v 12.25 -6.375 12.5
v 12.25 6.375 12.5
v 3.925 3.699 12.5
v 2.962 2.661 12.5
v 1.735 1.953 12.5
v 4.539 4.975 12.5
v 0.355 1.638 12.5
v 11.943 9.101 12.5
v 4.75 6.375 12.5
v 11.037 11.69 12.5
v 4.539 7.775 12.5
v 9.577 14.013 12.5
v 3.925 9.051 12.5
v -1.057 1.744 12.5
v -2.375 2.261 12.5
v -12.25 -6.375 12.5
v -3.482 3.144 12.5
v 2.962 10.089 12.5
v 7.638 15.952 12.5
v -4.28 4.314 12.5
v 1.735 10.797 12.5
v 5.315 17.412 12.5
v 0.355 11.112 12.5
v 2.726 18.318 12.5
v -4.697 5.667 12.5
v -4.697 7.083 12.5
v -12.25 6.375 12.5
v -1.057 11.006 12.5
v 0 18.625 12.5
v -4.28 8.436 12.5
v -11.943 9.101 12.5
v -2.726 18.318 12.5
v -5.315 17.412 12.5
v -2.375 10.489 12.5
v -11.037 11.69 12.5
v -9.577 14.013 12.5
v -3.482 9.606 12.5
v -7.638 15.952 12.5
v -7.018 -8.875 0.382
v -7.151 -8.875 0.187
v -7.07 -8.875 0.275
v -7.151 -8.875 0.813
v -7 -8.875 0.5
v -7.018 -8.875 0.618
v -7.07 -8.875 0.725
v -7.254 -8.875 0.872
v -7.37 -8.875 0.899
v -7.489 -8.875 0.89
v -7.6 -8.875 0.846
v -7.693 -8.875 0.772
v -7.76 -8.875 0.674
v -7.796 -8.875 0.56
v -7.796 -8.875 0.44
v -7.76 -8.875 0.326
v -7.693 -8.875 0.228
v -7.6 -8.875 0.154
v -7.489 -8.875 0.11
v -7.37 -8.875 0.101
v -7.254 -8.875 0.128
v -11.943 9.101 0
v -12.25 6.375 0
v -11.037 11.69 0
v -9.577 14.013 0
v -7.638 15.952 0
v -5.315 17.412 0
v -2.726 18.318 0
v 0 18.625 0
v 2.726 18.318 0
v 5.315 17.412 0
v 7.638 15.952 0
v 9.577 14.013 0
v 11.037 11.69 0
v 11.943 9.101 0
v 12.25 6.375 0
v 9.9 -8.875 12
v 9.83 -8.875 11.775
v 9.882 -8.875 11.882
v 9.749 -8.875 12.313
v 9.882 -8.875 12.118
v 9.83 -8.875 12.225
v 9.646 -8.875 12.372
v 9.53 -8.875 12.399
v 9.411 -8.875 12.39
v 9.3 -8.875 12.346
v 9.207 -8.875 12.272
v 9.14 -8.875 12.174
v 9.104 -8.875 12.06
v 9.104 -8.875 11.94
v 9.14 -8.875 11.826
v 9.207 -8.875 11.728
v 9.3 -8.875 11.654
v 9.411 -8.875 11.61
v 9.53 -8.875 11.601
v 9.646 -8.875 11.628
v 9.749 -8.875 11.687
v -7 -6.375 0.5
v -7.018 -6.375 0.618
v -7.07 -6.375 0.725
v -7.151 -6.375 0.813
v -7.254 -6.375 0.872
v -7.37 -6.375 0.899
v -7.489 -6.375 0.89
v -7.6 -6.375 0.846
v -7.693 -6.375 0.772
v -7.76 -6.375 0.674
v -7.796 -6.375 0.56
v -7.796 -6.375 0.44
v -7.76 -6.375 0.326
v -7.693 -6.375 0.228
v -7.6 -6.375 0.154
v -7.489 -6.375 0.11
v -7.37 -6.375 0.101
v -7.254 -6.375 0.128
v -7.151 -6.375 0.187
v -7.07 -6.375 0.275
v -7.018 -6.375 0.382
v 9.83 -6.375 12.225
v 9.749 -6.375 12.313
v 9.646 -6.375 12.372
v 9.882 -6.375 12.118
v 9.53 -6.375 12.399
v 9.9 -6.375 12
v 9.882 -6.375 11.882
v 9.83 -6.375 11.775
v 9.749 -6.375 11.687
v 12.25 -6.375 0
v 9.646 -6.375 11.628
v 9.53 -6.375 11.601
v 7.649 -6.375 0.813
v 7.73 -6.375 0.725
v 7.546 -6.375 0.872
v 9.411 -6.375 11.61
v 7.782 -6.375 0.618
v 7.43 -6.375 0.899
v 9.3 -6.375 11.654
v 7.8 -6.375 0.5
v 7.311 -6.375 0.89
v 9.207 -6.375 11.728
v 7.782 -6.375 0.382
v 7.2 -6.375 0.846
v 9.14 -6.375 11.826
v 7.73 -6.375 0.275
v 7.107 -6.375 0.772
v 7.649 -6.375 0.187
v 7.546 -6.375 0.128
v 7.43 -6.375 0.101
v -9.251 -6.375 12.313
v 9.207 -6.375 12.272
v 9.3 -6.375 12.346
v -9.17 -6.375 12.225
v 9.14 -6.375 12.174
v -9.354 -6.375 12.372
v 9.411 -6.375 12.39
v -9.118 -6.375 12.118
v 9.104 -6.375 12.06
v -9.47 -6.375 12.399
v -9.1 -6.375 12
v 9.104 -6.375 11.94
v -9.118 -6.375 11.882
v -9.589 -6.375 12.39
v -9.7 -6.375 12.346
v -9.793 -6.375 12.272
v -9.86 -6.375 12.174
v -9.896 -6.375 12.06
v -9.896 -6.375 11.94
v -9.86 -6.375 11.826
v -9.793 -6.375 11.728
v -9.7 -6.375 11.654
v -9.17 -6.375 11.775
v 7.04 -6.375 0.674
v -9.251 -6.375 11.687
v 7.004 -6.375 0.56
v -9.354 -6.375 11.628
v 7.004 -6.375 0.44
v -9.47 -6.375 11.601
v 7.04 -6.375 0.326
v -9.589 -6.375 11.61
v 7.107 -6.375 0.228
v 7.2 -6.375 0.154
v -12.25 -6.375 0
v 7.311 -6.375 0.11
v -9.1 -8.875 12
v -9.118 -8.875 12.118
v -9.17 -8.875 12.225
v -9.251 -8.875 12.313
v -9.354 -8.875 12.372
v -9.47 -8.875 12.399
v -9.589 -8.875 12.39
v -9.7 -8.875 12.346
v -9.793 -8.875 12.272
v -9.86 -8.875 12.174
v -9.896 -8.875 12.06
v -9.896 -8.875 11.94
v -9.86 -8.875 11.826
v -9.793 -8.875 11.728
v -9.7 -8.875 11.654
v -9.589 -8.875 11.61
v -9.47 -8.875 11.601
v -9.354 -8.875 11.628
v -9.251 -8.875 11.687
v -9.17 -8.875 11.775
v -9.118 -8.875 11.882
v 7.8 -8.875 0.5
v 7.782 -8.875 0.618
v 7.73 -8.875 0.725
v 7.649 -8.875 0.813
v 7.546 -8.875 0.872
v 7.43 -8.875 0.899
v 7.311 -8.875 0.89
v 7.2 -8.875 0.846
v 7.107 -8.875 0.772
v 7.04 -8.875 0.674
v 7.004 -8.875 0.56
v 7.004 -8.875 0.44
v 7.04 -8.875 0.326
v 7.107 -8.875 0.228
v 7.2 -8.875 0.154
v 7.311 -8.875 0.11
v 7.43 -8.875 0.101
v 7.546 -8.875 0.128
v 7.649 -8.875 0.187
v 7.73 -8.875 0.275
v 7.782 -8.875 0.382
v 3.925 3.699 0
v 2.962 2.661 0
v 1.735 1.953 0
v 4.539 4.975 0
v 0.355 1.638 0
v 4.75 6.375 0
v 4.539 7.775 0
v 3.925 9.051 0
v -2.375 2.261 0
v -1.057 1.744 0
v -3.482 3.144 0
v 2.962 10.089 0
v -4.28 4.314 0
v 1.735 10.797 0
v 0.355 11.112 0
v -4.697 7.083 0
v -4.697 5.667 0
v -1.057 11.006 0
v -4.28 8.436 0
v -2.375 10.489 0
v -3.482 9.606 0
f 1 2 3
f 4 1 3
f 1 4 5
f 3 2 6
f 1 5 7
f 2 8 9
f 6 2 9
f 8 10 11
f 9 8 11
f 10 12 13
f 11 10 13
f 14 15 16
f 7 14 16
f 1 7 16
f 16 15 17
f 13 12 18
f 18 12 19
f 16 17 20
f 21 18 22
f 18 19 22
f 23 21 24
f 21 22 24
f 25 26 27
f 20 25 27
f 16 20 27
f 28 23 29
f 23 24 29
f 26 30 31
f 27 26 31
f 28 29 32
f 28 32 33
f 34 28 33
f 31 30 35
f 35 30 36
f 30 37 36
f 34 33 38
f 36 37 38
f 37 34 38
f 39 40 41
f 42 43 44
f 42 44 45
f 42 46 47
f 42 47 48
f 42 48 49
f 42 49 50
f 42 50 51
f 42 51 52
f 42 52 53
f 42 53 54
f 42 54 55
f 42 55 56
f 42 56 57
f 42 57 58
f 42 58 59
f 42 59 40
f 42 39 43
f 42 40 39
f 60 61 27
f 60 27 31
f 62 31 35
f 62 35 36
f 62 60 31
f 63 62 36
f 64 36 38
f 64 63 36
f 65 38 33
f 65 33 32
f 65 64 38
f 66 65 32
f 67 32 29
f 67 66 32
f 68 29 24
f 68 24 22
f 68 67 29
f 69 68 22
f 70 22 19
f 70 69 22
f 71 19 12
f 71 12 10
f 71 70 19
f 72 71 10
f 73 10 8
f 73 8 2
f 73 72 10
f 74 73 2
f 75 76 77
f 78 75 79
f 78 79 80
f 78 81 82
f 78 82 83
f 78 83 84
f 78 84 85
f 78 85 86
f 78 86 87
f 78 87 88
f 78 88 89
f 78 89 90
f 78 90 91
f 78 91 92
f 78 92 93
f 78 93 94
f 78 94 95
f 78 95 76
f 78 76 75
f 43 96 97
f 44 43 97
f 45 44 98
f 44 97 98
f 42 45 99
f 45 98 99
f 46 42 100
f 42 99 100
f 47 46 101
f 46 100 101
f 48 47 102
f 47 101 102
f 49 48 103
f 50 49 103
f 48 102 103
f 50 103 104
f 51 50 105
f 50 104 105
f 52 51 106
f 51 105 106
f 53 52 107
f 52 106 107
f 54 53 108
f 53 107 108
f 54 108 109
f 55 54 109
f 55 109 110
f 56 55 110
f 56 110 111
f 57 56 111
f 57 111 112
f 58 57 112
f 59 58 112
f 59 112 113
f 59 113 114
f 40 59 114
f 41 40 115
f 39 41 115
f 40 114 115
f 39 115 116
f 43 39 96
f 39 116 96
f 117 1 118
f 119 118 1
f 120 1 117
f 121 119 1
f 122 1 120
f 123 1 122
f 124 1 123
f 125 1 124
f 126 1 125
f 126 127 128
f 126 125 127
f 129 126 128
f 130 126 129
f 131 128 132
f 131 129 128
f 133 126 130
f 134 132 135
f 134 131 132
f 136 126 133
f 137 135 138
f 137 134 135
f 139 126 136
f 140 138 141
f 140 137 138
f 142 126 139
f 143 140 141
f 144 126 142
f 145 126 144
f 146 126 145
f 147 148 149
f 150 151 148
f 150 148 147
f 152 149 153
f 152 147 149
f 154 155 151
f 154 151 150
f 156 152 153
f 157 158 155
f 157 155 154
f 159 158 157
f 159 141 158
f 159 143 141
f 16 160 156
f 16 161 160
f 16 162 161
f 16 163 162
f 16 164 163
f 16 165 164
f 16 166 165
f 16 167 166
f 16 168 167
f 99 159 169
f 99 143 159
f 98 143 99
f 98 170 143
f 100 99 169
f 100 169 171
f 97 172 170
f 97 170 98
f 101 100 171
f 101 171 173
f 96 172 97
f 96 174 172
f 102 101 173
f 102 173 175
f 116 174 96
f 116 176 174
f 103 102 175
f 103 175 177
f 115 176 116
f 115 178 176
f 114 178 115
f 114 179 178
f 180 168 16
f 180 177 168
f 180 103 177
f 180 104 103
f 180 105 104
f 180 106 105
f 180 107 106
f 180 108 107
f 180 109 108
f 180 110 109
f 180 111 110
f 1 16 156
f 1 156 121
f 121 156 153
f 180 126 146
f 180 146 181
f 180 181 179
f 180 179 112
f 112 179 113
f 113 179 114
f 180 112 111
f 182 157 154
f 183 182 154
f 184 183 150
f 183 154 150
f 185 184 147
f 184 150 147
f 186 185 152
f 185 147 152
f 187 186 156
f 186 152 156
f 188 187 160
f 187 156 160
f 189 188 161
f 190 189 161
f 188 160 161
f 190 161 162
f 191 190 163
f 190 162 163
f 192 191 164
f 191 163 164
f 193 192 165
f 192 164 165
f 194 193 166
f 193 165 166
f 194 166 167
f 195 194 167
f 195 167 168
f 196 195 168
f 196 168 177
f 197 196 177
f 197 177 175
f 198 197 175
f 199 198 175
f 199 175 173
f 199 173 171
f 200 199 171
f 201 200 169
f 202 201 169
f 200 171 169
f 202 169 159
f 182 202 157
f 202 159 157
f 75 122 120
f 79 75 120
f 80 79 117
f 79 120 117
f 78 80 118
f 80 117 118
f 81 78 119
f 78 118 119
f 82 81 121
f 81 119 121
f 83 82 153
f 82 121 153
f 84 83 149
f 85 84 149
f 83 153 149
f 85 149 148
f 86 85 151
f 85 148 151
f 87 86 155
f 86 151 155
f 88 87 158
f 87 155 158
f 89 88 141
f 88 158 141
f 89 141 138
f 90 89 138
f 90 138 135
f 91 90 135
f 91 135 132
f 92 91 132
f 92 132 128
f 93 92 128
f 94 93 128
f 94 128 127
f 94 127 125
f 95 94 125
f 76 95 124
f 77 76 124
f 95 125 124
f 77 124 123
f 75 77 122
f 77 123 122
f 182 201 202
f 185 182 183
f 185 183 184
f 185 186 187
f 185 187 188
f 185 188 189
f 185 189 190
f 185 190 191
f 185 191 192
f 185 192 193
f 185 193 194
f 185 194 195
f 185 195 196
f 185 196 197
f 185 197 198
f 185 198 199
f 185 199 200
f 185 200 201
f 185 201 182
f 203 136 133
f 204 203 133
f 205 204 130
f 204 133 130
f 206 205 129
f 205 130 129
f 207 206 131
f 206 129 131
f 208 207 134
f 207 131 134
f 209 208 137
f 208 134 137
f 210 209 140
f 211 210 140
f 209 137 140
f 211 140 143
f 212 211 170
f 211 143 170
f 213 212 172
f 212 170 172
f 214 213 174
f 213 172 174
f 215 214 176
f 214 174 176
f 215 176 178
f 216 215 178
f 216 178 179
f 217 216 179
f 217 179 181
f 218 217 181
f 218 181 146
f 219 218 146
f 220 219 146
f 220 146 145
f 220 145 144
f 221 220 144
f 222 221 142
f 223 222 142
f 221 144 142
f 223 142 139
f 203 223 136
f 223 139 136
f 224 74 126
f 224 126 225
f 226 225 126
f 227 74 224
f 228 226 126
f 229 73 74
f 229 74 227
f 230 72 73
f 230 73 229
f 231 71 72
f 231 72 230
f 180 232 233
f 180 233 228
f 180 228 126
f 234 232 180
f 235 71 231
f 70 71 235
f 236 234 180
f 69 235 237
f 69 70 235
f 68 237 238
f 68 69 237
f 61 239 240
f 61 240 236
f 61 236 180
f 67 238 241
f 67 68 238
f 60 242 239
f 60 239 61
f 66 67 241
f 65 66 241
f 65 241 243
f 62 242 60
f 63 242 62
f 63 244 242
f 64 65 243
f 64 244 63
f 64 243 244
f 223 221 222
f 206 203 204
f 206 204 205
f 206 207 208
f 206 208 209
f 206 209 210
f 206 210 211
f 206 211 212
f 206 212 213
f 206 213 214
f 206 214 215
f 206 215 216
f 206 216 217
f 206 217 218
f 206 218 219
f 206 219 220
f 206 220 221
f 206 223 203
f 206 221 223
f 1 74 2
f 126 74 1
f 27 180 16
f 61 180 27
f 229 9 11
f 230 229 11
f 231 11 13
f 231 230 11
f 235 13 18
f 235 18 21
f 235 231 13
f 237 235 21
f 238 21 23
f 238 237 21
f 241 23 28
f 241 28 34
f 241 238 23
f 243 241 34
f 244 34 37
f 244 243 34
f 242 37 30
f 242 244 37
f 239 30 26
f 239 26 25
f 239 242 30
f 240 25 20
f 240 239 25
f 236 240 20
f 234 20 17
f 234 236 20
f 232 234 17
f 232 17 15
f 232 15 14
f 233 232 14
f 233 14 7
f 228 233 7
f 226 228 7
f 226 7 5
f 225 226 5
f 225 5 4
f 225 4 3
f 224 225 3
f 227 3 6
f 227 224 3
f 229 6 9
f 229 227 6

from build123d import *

# Parameters (mm, degrees)
SKETCH_1_R      = 4.75
EXTRUDE_1_DEPTH = 12.5
SKETCH_2_R      = 0.4
EXTRUDE_2_DEPTH = 2.5


with BuildPart() as part:
    # Эскиз1 → Бобышка-Вытянуть1 (new body)
    with BuildSketch(Plane.XY):
        with BuildLine():
            Line((12.25, -6.375), (-12.25, -6.375))
            Line((-12.25, -6.375), (-12.25, 6.375))
            ThreePointArc((-12.25, 6.375), (0, 18.625), (12.25, 6.375))
            Line((12.25, 6.375), (12.25, -6.375))
        make_face()
        with Locations((0, 6.375)):
            Circle(SKETCH_1_R, mode=Mode.SUBTRACT)
    extrude(amount=EXTRUDE_1_DEPTH)

    # Эскиз2 → Бобышка-Вытянуть2 (add)
    with BuildSketch(Plane.XZ.offset(6.375)):
        with Locations((7.4, 0.5)):
            Circle(SKETCH_2_R)
        with Locations((-7.4, 0.5)):
            Circle(SKETCH_2_R)
        with Locations((9.5, 12)):
            Circle(SKETCH_2_R)
        with Locations((-9.5, 12)):
            Circle(SKETCH_2_R)
    extrude(amount=EXTRUDE_2_DEPTH)


solid = part.part
